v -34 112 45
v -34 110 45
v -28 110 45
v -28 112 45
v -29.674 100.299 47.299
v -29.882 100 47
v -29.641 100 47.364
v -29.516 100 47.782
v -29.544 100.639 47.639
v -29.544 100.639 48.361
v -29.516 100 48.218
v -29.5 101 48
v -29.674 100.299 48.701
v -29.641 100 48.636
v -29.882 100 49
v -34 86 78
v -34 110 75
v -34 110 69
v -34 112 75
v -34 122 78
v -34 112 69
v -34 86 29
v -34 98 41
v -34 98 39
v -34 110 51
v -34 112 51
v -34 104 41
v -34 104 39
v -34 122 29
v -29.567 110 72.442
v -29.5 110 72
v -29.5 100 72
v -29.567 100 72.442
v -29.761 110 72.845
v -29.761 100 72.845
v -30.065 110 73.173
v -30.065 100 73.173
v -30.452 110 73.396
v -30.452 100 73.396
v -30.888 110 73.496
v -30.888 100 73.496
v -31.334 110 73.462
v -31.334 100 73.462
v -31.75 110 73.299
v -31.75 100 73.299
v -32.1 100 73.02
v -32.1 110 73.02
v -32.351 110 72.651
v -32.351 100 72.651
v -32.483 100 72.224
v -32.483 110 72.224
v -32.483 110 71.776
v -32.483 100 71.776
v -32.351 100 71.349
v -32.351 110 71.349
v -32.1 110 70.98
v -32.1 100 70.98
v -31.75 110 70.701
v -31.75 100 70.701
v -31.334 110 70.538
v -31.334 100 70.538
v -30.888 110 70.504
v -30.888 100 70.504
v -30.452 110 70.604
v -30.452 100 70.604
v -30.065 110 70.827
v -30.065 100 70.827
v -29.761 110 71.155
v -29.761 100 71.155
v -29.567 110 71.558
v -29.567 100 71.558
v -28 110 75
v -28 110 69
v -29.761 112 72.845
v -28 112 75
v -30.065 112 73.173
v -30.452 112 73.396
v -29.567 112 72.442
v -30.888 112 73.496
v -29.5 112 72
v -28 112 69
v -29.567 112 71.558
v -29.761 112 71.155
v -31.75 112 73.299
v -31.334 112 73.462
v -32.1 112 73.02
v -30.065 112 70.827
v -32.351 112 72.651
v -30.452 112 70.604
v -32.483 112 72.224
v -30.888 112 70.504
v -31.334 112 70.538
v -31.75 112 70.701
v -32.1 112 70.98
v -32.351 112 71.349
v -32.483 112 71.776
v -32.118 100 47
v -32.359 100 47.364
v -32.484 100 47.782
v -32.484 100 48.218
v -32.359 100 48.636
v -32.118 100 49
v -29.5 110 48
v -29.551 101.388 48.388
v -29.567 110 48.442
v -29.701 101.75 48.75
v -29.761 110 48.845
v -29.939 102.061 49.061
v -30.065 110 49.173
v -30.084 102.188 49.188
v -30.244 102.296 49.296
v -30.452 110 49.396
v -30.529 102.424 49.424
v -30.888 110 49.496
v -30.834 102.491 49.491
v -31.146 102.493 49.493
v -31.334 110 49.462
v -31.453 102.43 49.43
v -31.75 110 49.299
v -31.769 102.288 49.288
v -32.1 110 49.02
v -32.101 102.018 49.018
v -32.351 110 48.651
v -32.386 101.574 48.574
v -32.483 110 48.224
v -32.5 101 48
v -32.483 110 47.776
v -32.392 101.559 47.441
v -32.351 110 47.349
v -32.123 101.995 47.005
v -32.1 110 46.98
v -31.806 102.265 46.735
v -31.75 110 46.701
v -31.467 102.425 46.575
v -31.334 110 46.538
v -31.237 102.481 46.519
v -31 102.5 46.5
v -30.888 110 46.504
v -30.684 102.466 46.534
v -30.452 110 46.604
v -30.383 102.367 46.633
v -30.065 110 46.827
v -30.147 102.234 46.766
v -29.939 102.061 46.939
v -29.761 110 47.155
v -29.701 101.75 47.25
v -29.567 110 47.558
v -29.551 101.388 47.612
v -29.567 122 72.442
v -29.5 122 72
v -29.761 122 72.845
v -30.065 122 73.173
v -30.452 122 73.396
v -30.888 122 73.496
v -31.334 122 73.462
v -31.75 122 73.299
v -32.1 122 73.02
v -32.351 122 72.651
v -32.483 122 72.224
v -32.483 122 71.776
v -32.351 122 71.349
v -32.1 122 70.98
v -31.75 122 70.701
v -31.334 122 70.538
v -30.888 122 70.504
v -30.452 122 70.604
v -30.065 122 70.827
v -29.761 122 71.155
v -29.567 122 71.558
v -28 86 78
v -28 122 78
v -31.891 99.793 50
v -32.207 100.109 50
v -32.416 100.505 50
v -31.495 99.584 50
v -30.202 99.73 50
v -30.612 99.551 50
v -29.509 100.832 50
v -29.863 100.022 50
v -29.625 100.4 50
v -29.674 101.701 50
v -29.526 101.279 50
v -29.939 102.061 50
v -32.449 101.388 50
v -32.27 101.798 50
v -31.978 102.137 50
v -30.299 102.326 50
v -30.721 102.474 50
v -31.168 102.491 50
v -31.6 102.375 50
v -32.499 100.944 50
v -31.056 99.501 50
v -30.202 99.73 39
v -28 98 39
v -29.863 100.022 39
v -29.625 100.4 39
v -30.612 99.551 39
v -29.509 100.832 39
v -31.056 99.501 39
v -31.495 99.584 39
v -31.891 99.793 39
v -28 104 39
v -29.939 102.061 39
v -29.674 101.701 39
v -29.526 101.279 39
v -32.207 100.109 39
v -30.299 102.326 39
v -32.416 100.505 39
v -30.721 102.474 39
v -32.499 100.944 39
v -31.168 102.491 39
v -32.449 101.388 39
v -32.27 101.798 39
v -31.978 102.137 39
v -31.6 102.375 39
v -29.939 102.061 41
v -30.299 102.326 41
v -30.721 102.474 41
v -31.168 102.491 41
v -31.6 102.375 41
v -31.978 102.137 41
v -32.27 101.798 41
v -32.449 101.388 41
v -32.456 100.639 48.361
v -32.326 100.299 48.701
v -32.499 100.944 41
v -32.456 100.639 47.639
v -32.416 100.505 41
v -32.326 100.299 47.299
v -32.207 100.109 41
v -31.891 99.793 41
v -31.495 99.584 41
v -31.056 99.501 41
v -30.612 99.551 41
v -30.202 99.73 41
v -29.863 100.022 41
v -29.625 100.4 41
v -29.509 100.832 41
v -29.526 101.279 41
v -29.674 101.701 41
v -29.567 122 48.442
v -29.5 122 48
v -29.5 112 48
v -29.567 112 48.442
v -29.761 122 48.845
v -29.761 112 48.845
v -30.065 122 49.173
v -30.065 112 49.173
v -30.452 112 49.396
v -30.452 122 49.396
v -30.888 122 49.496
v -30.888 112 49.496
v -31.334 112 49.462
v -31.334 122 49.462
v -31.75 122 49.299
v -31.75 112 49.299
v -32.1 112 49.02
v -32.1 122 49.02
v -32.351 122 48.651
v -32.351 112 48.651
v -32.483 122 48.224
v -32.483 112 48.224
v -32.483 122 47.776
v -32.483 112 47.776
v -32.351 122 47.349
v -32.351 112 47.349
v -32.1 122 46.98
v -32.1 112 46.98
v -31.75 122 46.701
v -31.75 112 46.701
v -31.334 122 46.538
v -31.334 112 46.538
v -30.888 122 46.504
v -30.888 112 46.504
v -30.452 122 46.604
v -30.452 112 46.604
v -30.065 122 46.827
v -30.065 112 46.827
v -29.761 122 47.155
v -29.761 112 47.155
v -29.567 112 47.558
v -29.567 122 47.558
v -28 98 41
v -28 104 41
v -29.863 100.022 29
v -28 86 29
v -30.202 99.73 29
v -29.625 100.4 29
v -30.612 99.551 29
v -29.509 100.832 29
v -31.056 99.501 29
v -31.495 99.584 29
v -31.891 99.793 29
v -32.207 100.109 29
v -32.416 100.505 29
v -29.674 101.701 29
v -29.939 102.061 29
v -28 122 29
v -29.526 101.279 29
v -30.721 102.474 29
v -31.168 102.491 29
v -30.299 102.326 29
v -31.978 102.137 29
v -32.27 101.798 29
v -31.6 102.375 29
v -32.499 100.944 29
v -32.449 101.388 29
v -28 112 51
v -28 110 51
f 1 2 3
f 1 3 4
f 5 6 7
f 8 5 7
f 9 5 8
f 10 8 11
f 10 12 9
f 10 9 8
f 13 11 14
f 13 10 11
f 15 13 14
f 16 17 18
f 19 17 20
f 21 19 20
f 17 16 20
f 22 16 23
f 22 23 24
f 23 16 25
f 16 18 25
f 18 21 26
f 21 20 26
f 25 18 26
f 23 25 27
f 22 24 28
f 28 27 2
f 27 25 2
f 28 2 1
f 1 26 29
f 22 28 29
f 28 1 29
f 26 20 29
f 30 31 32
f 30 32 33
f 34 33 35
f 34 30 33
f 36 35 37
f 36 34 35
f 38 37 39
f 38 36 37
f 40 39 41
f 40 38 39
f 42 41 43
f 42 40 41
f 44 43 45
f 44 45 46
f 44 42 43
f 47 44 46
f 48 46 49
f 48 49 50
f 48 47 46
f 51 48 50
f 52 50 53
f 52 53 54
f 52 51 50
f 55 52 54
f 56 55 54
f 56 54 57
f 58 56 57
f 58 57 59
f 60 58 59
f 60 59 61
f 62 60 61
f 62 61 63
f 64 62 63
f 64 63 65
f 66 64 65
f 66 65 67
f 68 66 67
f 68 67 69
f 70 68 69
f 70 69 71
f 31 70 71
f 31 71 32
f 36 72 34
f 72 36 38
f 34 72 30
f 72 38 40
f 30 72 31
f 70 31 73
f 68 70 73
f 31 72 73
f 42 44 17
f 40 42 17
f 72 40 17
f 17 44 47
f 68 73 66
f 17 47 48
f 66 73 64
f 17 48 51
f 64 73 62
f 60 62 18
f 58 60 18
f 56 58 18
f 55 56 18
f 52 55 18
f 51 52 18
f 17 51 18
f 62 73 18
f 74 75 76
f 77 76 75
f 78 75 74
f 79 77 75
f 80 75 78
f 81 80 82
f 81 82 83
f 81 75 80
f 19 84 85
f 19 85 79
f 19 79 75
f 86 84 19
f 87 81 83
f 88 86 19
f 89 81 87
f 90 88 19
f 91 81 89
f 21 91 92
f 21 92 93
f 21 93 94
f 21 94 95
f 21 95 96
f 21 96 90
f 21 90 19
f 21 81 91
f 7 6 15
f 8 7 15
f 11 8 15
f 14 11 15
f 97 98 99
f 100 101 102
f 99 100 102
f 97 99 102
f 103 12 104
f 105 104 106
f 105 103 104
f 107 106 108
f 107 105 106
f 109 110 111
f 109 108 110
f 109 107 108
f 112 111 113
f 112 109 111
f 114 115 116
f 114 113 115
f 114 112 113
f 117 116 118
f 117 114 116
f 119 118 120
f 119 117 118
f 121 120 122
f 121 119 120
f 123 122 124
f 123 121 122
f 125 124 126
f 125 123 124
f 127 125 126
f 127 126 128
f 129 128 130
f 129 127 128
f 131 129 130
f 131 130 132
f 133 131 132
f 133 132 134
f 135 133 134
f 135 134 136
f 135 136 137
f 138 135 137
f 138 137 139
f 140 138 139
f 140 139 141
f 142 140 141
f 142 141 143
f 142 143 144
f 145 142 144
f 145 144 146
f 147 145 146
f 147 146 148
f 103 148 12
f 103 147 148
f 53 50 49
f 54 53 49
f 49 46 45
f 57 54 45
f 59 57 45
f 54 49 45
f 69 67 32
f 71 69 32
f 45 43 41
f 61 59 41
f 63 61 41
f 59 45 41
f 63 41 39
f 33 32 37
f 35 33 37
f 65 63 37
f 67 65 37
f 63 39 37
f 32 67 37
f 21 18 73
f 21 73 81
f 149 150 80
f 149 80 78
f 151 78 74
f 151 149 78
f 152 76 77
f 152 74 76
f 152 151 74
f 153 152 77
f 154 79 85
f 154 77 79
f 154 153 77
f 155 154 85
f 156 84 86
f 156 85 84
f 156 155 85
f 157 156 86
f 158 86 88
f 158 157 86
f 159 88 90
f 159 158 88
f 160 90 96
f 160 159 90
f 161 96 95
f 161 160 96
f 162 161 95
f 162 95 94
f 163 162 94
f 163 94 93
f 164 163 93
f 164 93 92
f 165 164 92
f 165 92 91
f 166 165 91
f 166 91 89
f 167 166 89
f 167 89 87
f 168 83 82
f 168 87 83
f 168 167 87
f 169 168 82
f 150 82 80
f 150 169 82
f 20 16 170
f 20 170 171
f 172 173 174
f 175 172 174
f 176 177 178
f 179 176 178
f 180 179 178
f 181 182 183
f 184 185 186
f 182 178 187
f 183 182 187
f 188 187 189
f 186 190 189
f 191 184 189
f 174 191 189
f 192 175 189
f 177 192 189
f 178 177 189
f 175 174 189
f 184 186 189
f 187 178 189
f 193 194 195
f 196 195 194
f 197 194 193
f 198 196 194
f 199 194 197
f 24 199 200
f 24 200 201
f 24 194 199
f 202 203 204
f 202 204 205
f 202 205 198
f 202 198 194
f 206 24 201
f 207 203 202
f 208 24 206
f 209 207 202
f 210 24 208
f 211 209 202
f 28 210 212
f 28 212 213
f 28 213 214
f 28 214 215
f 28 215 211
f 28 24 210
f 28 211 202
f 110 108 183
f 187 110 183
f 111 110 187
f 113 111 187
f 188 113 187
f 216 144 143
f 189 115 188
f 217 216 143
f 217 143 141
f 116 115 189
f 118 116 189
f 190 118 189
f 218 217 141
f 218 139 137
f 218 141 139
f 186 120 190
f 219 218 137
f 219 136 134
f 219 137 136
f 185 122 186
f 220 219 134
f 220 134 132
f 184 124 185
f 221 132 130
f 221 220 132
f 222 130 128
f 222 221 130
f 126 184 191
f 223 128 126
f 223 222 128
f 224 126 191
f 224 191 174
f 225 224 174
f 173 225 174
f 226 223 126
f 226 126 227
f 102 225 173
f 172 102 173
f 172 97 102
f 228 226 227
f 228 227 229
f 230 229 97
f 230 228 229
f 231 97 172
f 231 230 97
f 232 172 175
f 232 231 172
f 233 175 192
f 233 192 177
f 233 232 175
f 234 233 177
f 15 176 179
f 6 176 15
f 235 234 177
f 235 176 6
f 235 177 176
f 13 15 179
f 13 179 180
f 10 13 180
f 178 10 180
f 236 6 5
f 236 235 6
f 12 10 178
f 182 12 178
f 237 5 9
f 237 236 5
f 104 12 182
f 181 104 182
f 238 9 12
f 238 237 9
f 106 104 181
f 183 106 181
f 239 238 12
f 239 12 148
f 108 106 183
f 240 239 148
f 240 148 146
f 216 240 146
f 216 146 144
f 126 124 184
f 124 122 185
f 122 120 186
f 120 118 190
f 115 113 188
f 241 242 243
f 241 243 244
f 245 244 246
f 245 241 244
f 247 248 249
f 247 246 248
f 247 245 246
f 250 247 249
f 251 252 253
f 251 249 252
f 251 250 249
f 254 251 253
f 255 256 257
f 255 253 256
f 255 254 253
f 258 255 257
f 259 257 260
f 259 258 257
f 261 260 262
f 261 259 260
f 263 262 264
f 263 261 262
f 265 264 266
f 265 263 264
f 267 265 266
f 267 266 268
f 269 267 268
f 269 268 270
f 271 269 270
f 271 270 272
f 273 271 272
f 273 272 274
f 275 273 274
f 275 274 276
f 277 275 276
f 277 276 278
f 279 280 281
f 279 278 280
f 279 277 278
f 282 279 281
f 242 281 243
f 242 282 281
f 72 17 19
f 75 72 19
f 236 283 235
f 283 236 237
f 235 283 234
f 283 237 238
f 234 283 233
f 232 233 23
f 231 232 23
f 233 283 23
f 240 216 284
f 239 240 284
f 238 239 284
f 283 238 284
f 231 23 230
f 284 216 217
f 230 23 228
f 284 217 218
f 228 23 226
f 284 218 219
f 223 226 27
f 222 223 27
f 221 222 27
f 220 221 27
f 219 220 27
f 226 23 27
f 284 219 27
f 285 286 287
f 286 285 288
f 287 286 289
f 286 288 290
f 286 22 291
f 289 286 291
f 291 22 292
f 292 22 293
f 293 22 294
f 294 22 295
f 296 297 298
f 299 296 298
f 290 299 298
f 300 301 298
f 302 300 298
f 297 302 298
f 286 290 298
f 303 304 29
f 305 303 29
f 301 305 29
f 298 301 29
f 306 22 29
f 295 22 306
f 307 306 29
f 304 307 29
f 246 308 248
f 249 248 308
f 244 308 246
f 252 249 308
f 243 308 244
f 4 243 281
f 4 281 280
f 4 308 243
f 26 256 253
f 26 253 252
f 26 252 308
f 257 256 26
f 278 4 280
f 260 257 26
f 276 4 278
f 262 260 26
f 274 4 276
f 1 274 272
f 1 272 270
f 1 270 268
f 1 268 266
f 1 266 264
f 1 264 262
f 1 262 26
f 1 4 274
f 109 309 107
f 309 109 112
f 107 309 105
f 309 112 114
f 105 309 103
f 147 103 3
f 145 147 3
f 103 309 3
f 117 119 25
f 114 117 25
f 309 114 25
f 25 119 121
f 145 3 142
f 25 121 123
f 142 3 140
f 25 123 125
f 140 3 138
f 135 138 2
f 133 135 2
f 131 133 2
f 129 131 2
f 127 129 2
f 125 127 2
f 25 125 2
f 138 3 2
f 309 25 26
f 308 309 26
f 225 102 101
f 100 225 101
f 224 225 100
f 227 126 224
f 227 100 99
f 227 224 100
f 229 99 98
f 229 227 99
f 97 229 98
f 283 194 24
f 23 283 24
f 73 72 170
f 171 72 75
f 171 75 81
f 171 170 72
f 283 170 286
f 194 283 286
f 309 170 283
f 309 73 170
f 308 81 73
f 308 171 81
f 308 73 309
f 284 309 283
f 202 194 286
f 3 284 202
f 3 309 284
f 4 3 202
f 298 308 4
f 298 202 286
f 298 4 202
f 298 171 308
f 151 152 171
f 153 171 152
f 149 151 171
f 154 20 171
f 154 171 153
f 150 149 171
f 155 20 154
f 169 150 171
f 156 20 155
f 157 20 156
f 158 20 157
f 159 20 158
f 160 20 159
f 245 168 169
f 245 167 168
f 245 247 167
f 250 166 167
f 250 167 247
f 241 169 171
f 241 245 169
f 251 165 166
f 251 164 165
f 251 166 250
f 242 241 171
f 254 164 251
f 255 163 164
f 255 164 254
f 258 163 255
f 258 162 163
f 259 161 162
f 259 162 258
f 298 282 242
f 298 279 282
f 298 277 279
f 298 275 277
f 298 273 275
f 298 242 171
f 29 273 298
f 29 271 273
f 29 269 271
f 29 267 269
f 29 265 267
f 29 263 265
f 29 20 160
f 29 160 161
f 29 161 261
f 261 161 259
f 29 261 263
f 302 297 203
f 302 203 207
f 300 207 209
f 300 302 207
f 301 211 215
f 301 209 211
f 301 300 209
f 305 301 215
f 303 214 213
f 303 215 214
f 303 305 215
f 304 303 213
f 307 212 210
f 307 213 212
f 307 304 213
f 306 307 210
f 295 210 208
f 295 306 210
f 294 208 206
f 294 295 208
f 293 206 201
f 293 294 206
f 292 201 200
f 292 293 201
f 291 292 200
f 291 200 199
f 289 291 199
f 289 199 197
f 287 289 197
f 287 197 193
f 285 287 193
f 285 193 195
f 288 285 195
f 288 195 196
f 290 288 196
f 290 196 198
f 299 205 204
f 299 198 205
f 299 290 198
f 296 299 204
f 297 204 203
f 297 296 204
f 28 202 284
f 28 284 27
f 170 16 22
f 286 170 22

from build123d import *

# Parameters (mm, degrees)
CYLINDER1886_R               = 1.5
CYLINDER1886_DEPTH           = 50
CYLINDER1888_R               = 1.5
CYLINDER1888_DEPTH           = 50
CYLINDER1887_R               = 1.5
CYLINDER1887_DEPTH           = 50
CYLINDER1885_R               = 1.5
CYLINDER1885_DEPTH           = 50
BOX794_W                     = 2
BOX794_H                     = 6
BOX794_DEPTH                 = 6
BOX797_W                     = 2
BOX797_H                     = 6
BOX797_DEPTH                 = 6
BOX795_W                     = 2
BOX795_H                     = 6
BOX795_DEPTH                 = 6
BOX796_W                     = 2
BOX796_H                     = 6
BOX796_DEPTH                 = 6
CYLINDER1871_R               = 1.5
CYLINDER1871_DEPTH           = 50
CYLINDER1871_PLACEMENT_ANGLE = 45
BOX781_W                     = 6
BOX781_H                     = 8
BOX781_DEPTH                 = 2
BOX784_W                     = 49
BOX784_H                     = 36
BOX784_DEPTH                 = 6


with BuildPart() as v_lec1886:
    # Cylinder1886 → Cylinder1886 (new body)
    with BuildSketch(Plane(origin=(-31, 150, 72), x_dir=(1, 0, 0), z_dir=(0, -1, 0))):
        Circle(CYLINDER1886_R)
    extrude(amount=CYLINDER1886_DEPTH)


with BuildPart() as v_lec1888:
    # Cylinder1888 → Cylinder1888 (new body)
    with BuildSketch(Plane(origin=(31, 150, 48), x_dir=(1, 0, 0), z_dir=(0, -1, 0))):
        Circle(CYLINDER1888_R)
    extrude(amount=CYLINDER1888_DEPTH)


with BuildPart() as v_lec1887:
    # Cylinder1887 → Cylinder1887 (new body)
    with BuildSketch(Plane(origin=(31, 150, 72), x_dir=(1, 0, 0), z_dir=(0, -1, 0))):
        Circle(CYLINDER1887_R)
    extrude(amount=CYLINDER1887_DEPTH)


with BuildPart() as compound949:
    # Cylinder1885 → Cylinder1885 (new body)
    with BuildSketch(Plane(origin=(-31, 150, 48), x_dir=(1, 0, 0), z_dir=(0, -1, 0))):
        Circle(CYLINDER1885_R)
    extrude(amount=CYLINDER1885_DEPTH)

    # Compound949: union Válec1886, Válec1888, Válec1887
    add(v_lec1886.part)
    add(v_lec1888.part)
    add(v_lec1887.part)


with BuildPart() as krychle794:
    # Box794 → Box794 (new body)
    with BuildSketch(Plane(origin=(-28, 110, 69), x_dir=(0, 1, 0), z_dir=(0, 0, 1))):
        with Locations((1, 3)):
            Rectangle(BOX794_W, BOX794_H)
    extrude(amount=BOX794_DEPTH)


with BuildPart() as krychle797:
    # Box797 → Box797 (new body)
    with BuildSketch(Plane(origin=(34, 110, 45), x_dir=(0, 1, 0), z_dir=(0, 0, 1))):
        with Locations((1, 3)):
            Rectangle(BOX797_W, BOX797_H)
    extrude(amount=BOX797_DEPTH)


with BuildPart() as krychle795:
    # Box795 → Box795 (new body)
    with BuildSketch(Plane(origin=(34, 110, 69), x_dir=(0, 1, 0), z_dir=(0, 0, 1))):
        with Locations((1, 3)):
            Rectangle(BOX795_W, BOX795_H)
    extrude(amount=BOX795_DEPTH)


with BuildPart() as compound948:
    # Box796 → Box796 (new body)
    with BuildSketch(Plane(origin=(-28, 110, 45), x_dir=(0, 1, 0), z_dir=(0, 0, 1))):
        with Locations((1, 3)):
            Rectangle(BOX796_W, BOX796_H)
    extrude(amount=BOX796_DEPTH)

    # Compound948: union Krychle794, Krychle797, Krychle795
    add(krychle794.part)
    add(krychle797.part)
    add(krychle795.part)


with BuildPart() as compound941:
    # Cylinder1871 → Cylinder1871 (new body)
    with BuildSketch(Plane.XY):
        Circle(CYLINDER1871_R)
    extrude(amount=CYLINDER1871_DEPTH)


with BuildPart() as compound941_1:
    # Cylinder1871 placement: moved
    add(compound941.part.moved(Location((-31, 101, 0))).rotate(Axis((-31, 101, 0), (0, 0, 1)), CYLINDER1871_PLACEMENT_ANGLE))


with BuildPart() as compound938:
    # Box781 → Box781 (new body)
    with BuildSketch(Plane(origin=(-27, 98, 39), x_dir=(0, 1, 0), z_dir=(0, 0, 1))):
        with Locations((3, 4)):
            Rectangle(BOX781_W, BOX781_H)
    extrude(amount=BOX781_DEPTH)


with BuildPart() as cut595:
    # Box784 → Box784 (new body)
    with BuildSketch(Plane(origin=(-34, 86, 78), x_dir=(0, 0, -1), z_dir=(1, 0, 0))):
        with Locations((24.5, 18)):
            Rectangle(BOX784_W, BOX784_H)
    extrude(amount=BOX784_DEPTH)

    # Cut586: cut Compound938
    add(compound938.part, mode=Mode.SUBTRACT)

    # Cut589: cut Compound941
    add(compound941_1.part, mode=Mode.SUBTRACT)

    # Cut594: cut Compound948
    add(compound948.part, mode=Mode.SUBTRACT)

    # Cut595: cut Compound949
    add(compound949.part, mode=Mode.SUBTRACT)


solid = cut595.part
